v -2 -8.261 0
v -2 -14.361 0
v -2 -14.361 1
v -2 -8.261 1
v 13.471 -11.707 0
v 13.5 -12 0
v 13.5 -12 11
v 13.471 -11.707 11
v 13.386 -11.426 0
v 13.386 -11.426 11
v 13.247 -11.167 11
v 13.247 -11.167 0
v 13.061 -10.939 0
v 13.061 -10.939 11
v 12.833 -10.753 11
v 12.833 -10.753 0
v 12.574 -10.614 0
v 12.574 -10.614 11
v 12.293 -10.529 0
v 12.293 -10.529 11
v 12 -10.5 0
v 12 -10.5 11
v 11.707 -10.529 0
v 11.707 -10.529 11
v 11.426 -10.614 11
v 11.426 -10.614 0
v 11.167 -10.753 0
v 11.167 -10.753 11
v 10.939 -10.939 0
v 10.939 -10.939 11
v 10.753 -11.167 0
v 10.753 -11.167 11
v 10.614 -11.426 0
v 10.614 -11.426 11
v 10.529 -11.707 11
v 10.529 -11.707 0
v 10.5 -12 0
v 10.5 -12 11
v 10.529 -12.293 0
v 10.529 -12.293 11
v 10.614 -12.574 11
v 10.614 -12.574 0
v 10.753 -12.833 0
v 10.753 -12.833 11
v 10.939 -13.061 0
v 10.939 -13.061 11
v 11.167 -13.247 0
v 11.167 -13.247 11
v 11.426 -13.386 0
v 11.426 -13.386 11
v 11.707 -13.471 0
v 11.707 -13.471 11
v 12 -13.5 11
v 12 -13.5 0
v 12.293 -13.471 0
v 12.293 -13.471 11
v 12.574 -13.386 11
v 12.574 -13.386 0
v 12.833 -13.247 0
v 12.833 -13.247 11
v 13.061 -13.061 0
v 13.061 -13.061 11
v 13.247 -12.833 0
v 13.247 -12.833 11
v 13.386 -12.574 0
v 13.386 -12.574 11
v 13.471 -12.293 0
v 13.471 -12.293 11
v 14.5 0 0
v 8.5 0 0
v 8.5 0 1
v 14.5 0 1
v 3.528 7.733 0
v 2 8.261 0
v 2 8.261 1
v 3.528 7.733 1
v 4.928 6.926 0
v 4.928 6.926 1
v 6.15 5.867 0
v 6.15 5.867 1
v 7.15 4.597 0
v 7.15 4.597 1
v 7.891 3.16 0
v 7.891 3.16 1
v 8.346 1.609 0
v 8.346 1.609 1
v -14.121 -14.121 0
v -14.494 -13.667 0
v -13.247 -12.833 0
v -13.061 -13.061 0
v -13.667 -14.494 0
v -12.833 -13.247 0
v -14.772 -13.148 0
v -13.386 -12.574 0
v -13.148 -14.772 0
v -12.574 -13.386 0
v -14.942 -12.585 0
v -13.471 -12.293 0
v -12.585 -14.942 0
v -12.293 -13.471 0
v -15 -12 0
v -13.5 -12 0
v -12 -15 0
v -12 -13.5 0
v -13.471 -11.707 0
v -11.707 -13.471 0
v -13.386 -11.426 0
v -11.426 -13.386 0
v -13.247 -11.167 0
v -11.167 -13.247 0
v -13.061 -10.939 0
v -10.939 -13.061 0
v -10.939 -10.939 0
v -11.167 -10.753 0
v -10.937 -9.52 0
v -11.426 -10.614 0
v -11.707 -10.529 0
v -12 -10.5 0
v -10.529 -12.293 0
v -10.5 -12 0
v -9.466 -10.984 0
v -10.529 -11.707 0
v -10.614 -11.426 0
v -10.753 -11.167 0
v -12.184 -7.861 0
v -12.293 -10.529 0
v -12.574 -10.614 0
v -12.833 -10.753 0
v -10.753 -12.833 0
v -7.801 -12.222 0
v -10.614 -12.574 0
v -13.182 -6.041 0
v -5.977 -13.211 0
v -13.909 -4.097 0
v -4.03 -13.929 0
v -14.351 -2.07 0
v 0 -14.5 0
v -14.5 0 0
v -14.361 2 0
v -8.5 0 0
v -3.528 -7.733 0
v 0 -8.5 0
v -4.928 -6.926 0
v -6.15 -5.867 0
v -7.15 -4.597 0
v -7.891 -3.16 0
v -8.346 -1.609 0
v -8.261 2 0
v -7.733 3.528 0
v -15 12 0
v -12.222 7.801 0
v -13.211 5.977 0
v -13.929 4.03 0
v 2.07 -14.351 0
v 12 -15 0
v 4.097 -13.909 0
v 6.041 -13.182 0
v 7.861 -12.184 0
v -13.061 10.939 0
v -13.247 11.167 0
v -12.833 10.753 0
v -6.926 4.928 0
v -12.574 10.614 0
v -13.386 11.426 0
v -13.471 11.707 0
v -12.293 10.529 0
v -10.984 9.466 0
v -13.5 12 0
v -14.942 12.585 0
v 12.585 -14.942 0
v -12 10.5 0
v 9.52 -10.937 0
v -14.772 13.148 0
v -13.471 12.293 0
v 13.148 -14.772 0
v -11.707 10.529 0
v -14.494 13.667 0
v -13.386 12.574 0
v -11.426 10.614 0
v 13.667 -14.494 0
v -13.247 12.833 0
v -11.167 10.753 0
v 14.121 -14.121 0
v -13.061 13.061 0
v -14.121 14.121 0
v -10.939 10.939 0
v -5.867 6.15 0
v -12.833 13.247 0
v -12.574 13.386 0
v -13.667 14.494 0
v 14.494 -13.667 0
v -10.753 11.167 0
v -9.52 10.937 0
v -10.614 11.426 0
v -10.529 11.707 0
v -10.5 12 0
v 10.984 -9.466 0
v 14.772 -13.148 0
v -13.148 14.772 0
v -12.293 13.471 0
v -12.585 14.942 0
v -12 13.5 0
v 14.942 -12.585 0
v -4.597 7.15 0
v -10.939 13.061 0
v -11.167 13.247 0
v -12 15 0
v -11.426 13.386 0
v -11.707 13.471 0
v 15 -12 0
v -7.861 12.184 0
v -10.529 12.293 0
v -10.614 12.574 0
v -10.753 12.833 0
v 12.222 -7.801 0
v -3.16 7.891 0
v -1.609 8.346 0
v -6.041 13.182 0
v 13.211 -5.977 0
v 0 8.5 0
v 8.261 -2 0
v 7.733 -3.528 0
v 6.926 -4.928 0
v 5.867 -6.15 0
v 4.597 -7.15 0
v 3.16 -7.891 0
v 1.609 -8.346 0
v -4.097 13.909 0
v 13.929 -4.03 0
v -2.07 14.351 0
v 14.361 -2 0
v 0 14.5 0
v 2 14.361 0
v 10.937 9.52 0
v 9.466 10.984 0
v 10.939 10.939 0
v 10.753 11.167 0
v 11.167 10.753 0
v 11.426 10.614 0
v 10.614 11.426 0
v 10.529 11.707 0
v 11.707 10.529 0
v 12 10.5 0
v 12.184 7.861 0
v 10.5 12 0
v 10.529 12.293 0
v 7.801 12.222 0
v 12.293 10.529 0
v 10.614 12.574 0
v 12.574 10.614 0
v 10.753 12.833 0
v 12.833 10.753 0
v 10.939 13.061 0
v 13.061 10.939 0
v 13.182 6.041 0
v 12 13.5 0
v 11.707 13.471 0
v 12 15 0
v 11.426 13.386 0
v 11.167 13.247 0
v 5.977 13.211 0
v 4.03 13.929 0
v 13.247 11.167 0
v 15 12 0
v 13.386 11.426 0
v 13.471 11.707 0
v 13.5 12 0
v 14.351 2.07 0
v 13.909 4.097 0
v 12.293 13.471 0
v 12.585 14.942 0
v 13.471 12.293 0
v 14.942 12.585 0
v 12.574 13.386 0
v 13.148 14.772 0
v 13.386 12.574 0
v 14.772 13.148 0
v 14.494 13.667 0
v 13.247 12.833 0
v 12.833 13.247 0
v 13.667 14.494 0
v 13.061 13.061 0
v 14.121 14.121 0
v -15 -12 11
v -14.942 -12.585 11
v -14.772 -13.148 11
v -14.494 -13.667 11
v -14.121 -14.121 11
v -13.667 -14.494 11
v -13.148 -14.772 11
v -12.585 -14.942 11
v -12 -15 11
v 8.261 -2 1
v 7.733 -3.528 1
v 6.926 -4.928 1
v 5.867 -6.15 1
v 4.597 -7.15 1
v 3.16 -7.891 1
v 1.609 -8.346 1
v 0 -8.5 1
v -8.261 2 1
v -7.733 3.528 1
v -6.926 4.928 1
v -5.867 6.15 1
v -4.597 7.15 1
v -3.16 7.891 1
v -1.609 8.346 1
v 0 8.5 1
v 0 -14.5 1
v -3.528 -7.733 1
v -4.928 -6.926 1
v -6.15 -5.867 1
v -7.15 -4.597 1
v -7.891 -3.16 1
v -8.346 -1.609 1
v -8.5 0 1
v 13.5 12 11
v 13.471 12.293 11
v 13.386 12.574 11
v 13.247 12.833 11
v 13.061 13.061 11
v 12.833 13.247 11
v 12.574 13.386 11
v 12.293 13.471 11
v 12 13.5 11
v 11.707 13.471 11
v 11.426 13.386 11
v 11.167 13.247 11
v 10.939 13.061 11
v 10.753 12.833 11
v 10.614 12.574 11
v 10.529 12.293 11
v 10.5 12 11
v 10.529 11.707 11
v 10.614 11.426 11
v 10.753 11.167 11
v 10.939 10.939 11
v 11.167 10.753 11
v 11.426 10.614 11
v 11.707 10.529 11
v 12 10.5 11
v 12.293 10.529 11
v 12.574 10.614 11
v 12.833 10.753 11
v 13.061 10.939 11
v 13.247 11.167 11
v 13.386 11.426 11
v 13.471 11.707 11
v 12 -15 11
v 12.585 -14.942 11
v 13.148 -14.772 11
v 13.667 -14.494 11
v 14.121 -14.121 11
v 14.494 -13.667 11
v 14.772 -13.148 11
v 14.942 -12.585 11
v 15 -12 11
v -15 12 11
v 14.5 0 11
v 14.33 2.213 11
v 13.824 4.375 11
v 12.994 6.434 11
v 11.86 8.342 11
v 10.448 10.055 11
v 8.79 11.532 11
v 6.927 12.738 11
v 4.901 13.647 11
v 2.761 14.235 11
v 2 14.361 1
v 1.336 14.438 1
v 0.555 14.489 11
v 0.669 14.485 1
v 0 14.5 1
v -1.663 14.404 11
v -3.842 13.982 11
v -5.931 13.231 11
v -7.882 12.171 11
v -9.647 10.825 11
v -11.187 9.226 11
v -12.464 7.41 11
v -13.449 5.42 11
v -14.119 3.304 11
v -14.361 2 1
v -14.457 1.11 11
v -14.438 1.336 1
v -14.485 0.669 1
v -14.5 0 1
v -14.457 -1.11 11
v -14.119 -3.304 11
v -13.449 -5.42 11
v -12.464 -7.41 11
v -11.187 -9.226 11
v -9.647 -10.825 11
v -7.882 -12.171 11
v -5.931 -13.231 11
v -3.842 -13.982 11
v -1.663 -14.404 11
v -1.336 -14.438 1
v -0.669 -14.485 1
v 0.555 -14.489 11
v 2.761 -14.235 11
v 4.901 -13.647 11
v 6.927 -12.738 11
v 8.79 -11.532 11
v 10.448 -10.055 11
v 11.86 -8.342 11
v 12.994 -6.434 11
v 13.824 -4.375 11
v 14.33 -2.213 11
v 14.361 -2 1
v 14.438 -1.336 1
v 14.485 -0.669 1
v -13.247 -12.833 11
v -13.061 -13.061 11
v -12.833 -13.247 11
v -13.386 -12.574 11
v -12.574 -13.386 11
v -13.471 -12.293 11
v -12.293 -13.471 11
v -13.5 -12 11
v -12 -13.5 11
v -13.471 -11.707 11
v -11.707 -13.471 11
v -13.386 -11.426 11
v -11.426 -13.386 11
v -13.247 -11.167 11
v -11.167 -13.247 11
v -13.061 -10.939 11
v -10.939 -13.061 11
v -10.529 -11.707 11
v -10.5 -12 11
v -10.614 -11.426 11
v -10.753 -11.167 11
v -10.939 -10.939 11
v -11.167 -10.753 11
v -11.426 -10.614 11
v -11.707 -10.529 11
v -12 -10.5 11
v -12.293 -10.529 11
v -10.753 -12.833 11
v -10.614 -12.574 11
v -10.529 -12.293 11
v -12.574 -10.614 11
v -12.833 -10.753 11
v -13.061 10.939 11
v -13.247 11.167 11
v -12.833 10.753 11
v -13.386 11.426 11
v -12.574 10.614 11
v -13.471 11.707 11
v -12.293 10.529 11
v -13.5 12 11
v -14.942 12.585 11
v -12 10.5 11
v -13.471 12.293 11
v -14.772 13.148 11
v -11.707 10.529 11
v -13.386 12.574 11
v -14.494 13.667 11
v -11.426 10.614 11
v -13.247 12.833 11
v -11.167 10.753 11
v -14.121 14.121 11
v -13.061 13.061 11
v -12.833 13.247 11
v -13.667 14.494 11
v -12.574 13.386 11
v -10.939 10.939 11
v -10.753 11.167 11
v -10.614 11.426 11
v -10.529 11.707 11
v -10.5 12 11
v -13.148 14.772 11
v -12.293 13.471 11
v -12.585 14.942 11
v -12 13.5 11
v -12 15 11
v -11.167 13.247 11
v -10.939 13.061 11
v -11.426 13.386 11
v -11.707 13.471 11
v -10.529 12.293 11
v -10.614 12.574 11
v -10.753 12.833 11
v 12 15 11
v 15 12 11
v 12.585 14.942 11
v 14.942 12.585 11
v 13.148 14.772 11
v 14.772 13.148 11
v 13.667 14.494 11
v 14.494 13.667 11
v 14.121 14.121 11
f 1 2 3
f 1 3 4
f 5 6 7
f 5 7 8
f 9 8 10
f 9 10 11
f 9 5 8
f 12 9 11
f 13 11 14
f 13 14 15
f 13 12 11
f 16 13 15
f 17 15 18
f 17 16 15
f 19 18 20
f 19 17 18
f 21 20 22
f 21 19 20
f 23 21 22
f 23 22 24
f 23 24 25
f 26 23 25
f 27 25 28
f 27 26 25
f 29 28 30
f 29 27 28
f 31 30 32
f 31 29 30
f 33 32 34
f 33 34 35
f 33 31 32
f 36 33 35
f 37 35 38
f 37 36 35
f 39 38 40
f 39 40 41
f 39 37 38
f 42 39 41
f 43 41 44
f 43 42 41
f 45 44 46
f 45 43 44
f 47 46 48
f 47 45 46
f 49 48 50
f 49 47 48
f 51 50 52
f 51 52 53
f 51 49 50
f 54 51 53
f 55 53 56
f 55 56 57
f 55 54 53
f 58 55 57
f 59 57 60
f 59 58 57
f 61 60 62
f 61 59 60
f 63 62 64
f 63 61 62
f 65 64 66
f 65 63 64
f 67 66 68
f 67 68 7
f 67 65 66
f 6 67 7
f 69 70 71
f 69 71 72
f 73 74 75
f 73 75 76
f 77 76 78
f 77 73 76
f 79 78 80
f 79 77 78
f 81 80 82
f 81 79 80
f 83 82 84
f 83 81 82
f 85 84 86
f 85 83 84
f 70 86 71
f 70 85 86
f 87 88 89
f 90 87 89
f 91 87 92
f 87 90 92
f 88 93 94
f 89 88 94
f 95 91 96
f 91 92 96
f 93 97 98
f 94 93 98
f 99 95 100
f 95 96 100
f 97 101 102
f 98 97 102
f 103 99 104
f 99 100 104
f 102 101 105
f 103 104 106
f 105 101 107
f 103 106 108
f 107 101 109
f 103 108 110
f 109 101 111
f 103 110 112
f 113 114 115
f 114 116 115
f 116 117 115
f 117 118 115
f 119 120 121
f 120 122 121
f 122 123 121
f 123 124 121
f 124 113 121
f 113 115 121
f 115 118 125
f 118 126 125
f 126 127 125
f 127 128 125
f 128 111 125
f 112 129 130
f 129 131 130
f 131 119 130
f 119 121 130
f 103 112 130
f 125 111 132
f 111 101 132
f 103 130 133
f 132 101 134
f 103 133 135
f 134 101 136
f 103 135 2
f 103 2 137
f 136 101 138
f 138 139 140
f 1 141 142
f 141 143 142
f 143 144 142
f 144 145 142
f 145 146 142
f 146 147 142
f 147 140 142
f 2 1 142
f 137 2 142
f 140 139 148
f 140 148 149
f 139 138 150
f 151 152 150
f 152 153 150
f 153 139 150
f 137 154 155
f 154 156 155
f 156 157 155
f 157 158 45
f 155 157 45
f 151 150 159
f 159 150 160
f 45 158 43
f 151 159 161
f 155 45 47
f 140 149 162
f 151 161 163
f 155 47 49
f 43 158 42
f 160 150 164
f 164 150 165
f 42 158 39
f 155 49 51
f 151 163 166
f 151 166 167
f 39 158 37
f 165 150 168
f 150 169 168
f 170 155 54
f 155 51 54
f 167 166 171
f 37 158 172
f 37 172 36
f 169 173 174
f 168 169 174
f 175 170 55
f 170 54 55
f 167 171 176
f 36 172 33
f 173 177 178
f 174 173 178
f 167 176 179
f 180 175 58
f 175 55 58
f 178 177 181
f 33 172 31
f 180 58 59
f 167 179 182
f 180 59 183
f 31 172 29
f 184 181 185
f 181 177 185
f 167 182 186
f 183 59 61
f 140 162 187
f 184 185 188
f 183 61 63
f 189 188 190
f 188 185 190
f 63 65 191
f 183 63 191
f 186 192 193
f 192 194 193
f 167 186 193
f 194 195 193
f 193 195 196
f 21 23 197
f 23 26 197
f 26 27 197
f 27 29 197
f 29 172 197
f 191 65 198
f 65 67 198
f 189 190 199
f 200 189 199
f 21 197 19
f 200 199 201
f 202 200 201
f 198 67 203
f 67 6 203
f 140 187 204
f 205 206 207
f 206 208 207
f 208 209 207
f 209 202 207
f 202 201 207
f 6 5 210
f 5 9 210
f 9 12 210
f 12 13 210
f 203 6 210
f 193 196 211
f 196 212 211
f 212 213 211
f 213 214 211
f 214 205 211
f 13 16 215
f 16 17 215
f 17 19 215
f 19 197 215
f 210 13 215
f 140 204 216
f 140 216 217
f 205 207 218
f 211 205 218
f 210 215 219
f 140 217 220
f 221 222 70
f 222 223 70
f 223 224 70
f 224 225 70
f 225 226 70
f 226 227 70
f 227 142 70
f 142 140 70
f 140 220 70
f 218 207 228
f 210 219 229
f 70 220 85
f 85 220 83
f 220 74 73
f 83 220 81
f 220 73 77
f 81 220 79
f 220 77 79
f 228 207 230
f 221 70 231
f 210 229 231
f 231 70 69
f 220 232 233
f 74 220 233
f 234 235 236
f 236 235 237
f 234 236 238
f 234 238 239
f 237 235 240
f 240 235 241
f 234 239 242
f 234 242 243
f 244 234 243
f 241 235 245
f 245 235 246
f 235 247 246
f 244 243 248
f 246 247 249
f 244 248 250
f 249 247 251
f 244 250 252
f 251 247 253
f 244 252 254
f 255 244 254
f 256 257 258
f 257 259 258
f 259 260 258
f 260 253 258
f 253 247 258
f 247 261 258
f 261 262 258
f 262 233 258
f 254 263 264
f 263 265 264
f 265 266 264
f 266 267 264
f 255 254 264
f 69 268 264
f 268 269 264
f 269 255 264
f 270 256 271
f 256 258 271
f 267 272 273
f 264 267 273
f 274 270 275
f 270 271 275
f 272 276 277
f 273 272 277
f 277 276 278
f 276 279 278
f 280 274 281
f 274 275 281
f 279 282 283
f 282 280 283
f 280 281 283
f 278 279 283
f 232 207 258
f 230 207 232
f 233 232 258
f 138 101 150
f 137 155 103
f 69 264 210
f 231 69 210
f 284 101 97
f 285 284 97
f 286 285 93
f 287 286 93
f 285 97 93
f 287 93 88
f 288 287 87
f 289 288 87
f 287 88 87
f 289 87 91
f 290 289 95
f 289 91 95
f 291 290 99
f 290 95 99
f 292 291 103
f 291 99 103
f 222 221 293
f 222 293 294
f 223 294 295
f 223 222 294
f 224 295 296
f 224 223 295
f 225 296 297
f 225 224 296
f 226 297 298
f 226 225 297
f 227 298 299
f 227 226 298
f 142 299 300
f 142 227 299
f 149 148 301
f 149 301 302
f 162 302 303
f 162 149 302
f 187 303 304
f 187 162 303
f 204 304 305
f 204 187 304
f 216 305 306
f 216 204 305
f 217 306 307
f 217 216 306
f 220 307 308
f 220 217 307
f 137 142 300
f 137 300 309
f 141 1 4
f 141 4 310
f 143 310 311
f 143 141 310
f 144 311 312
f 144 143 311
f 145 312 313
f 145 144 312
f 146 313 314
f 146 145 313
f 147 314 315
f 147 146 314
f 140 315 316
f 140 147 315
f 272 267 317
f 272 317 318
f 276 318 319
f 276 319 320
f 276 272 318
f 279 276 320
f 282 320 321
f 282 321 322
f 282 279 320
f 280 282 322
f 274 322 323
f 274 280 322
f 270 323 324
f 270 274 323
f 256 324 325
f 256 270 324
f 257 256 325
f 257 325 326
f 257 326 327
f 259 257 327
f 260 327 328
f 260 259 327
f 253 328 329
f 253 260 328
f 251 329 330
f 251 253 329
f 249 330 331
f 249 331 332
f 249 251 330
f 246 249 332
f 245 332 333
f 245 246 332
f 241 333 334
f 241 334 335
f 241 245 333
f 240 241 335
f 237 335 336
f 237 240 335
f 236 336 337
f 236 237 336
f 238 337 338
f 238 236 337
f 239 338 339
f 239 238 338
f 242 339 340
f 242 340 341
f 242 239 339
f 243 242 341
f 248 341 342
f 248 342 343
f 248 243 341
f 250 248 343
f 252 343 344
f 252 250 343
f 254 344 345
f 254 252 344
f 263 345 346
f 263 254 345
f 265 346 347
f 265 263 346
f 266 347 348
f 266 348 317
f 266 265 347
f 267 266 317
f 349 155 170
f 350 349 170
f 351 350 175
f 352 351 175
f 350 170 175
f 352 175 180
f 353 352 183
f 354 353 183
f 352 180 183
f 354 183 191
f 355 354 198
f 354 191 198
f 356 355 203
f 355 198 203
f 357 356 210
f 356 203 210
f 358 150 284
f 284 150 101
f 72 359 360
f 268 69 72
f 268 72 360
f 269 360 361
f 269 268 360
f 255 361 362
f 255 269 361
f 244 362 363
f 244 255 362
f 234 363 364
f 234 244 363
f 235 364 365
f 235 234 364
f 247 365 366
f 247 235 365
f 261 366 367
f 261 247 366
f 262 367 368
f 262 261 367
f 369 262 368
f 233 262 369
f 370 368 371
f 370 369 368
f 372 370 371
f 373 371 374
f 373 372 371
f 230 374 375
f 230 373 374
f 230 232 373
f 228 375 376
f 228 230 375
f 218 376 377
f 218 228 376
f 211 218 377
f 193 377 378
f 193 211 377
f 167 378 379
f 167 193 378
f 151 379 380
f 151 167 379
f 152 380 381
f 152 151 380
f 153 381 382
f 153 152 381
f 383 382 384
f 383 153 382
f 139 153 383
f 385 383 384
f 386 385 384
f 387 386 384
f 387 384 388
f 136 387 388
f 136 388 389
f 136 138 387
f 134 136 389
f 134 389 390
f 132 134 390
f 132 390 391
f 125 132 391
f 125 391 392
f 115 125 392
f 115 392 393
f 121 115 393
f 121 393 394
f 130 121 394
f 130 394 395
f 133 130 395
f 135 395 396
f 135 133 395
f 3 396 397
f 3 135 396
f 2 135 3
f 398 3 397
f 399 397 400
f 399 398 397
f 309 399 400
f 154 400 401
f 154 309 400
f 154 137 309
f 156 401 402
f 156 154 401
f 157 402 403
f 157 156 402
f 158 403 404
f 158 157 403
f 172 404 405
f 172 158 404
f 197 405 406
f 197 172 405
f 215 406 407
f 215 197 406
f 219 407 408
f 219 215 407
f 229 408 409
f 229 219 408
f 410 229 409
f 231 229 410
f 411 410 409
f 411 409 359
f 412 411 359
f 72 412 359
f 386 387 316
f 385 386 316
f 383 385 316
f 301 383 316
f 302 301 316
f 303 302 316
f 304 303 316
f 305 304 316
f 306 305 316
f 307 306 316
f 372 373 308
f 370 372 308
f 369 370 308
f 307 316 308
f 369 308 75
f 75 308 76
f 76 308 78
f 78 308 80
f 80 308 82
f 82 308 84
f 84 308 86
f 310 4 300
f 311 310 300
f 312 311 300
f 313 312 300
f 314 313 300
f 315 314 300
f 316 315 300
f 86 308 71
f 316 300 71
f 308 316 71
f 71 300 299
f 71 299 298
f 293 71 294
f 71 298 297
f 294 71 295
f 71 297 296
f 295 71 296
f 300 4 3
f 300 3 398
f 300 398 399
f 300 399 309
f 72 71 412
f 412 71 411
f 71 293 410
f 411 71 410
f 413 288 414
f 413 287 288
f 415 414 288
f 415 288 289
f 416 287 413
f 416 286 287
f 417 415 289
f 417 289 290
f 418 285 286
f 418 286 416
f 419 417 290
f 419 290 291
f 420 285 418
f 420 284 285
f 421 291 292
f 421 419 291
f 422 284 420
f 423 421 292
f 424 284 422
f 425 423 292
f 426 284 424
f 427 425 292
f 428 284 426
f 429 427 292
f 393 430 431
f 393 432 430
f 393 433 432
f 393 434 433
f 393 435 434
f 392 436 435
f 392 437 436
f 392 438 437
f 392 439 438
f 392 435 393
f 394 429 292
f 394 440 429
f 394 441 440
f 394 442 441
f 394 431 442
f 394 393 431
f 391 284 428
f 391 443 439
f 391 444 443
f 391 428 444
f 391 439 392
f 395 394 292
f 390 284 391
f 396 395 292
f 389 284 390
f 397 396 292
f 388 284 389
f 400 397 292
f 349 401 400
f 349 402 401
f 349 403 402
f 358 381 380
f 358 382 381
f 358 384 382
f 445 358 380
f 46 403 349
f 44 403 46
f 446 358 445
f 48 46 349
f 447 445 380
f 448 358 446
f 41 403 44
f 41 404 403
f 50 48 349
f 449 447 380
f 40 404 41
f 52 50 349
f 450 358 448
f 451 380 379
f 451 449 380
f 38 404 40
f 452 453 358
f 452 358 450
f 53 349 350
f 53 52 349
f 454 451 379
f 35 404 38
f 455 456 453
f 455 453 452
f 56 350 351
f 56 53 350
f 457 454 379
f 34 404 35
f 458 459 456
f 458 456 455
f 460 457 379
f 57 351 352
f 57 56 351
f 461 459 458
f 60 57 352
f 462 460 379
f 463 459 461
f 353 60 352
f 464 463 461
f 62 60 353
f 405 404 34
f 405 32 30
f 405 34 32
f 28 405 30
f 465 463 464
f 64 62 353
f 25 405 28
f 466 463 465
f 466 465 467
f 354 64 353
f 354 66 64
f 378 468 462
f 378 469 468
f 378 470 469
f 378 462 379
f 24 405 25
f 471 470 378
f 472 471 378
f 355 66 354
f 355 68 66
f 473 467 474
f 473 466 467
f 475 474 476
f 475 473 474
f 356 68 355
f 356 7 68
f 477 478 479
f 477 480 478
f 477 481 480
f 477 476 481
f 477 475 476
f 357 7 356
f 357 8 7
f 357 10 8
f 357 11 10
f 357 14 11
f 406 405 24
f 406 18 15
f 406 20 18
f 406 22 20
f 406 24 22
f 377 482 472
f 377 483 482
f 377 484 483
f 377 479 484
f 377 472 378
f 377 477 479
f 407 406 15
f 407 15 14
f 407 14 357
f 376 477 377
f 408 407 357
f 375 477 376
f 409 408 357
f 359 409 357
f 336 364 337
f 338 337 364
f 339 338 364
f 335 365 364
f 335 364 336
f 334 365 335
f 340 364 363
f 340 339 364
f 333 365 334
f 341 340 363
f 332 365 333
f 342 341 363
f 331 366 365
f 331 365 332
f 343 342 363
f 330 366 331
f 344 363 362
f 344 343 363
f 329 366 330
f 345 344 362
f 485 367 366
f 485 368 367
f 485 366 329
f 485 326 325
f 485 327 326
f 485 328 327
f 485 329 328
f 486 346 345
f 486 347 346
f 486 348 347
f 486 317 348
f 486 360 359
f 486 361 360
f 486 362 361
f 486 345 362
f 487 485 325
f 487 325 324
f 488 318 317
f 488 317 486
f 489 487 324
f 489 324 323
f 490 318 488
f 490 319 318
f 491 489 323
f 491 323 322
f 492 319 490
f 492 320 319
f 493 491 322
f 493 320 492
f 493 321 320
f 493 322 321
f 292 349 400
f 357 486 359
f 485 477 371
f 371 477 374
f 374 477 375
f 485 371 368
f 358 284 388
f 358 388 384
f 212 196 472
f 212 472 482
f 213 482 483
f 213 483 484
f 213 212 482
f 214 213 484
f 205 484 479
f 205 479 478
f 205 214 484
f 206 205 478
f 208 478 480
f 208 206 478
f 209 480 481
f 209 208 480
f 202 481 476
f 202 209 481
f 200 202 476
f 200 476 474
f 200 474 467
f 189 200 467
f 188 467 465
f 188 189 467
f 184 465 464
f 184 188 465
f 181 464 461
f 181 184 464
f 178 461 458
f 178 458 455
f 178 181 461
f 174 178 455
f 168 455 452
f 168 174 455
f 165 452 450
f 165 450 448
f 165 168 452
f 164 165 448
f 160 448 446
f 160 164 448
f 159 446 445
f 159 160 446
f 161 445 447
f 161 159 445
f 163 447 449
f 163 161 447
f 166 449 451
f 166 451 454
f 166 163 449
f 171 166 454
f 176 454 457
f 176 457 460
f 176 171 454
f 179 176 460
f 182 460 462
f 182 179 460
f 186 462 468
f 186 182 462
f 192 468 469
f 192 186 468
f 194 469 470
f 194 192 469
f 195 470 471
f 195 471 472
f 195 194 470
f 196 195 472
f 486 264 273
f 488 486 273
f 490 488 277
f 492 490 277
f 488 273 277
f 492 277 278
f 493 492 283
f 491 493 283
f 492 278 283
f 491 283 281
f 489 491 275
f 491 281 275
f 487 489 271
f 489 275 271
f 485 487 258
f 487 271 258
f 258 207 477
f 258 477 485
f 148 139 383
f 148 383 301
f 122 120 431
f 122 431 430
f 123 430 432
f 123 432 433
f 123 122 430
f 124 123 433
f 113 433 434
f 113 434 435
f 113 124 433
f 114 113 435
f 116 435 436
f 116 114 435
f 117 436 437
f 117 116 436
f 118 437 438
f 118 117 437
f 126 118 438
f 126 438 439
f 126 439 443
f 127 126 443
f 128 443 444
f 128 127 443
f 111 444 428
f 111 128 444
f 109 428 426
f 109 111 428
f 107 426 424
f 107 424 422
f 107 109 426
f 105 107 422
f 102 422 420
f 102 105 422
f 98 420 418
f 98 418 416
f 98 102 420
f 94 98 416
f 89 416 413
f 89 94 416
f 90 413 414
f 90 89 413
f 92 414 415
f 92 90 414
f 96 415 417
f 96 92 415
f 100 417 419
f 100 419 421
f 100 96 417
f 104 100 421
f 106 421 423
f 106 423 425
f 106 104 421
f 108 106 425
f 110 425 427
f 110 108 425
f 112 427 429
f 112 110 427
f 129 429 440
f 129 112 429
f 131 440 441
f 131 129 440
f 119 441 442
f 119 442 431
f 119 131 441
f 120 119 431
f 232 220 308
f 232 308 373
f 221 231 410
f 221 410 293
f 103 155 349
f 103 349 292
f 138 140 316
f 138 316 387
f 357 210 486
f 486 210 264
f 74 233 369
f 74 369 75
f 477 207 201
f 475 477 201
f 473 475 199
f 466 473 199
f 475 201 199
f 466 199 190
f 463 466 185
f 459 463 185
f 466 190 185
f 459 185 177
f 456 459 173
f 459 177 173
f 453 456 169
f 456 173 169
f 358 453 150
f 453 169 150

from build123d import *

# Parameters (mm, degrees)
F0_R     = 1.5
F0_R_2   = 14.5
F1_DEPTH = 11
F3_DEPTH = 1


with BuildPart() as f1:
    # F0 (on Top) → F1 (new body)
    with BuildSketch(Plane.XY):
        with BuildLine():
            Line((-12, -15), (12, -15))
            ThreePointArc((12, -15), (14.12132, -14.12132), (15, -12))
            Line((15, -12), (15, 12))
            ThreePointArc((15, 12), (14.12132, 14.12132), (12, 15))
            Line((12, 15), (-12, 15))
            ThreePointArc((-12, 15), (-14.12132, 14.12132), (-15, 12))
            Line((-15, 12), (-15, -12))
            ThreePointArc((-15, -12), (-14.12132, -14.12132), (-12, -15))
        make_face()
        with Locations((-12, -12)):
            Circle(F0_R, mode=Mode.SUBTRACT)
        with Locations((12, -12)):
            Circle(F0_R, mode=Mode.SUBTRACT)
        Circle(F0_R_2, mode=Mode.SUBTRACT)
        with Locations((-12, 12)):
            Circle(F0_R, mode=Mode.SUBTRACT)
        with Locations((12, 12)):
            Circle(F0_R, mode=Mode.SUBTRACT)
    extrude(amount=F1_DEPTH)

    # F2 (on face) → F3 (join)
    with BuildSketch(Plane(origin=(0, 0, 0), x_dir=(1, 0, 0), z_dir=(0, 0, -1))):
        with BuildLine():
            Line((2, -15), (2, -8.261356))
            ThreePointArc((2, -8.261356), (6.680195, -5.255949), (8.5, 0))
            Line((8.5, 0), (15, 0))
            Line((15, 0), (15, 2))
            Line((15, 2), (8.261356, 2))
            ThreePointArc((8.261356, 2), (5.255949, 6.680195), (0, 8.5))
            Line((0, 8.5), (0, 15))
            Line((0, 15), (-2, 15))
            Line((-2, 15), (-2, 8.261356))
            ThreePointArc((-2, 8.261356), (-6.680195, 5.255949), (-8.5, 0))
            Line((-8.5, 0), (-15, 0))
            Line((-15, 0), (-15, -2))
            Line((-15, -2), (-8.261356, -2))
            ThreePointArc((-8.261356, -2), (-5.255949, -6.680195), (0, -8.5))
            Line((0, -8.5), (0, -15))
            Line((0, -15), (2, -15))
        make_face()
    extrude(amount=-F3_DEPTH)


solid = f1.part
